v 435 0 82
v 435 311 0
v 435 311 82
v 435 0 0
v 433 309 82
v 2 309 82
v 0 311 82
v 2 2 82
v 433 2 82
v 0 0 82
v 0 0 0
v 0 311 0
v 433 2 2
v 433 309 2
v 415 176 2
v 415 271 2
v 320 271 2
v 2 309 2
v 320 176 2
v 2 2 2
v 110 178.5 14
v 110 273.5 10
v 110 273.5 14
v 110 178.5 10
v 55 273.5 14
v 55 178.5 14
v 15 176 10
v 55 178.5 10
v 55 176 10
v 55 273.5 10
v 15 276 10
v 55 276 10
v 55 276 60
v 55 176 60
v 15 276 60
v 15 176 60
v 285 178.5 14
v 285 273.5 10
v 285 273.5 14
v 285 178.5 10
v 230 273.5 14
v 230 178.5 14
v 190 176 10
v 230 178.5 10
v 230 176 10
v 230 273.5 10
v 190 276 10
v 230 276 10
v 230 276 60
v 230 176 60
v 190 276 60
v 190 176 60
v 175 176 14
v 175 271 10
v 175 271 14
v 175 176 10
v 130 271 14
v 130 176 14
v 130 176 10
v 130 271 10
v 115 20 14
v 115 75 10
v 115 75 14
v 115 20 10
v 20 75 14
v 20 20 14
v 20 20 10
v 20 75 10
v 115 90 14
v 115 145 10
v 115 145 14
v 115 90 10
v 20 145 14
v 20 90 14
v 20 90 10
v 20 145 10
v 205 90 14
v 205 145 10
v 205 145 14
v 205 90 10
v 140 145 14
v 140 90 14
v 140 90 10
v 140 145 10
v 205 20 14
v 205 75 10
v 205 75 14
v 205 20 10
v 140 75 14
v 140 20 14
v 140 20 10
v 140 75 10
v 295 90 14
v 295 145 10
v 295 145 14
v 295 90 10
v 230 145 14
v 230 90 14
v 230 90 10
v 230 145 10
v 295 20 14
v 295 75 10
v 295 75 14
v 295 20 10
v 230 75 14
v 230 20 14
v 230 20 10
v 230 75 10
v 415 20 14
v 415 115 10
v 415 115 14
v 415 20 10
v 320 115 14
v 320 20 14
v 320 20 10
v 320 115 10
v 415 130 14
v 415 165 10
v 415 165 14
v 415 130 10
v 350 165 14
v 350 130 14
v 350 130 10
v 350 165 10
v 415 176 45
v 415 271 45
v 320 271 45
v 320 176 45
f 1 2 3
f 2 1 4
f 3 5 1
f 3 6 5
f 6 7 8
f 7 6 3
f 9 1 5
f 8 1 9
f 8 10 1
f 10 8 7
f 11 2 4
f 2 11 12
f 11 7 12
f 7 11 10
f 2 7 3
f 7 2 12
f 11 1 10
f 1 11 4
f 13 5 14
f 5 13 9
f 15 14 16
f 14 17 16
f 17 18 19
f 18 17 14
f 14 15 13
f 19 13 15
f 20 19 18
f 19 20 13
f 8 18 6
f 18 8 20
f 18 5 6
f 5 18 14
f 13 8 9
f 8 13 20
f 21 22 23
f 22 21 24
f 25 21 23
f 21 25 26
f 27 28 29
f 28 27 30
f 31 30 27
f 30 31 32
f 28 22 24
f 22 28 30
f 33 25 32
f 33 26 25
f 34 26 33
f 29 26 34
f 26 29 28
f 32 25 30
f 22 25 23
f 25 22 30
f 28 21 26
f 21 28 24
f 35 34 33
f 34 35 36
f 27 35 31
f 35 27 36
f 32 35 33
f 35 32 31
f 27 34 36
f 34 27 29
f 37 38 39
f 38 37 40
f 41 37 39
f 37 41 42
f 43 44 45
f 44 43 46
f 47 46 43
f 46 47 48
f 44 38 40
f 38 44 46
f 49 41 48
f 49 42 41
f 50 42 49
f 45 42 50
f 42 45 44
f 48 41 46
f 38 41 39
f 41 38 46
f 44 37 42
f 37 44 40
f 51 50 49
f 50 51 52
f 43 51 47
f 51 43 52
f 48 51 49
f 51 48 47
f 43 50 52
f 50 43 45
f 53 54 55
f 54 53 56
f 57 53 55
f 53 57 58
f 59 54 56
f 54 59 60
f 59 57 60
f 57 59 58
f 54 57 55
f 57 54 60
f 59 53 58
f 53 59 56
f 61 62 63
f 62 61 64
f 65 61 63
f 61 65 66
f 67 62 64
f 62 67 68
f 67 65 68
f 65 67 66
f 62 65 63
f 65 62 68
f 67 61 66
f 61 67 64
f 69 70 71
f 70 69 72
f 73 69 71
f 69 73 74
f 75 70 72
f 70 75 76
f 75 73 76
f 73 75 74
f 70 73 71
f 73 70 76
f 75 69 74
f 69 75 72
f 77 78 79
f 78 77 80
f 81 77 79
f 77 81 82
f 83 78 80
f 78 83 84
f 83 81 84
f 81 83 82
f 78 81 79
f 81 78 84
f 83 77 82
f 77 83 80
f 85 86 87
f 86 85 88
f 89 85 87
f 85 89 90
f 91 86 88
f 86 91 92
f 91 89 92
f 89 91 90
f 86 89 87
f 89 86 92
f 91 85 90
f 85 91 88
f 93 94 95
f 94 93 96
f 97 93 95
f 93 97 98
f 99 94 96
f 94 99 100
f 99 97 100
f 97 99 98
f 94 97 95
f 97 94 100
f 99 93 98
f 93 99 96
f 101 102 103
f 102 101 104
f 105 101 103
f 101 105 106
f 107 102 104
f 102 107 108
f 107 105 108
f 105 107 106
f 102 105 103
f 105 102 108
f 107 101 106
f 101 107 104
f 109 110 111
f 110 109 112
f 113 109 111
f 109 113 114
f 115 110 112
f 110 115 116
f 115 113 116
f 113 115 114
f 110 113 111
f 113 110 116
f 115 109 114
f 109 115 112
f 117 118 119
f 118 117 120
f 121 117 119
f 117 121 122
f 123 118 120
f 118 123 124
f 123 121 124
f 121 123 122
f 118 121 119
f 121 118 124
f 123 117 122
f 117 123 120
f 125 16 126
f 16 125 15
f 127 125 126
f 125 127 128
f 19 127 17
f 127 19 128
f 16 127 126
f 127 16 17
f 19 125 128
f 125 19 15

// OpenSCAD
width = 435;
height = 82;
depth = 311;

margin_lr = 20;


$fn = 64;


difference() {
  cube( [ width, depth, height ] );
            
  translate( [ 2, 2, 2 ] ) {
    cube( [ width - 4, depth - 4, height + 10 ] );
  }
}



// new channel left (blue)
translate( [ 15, depth - margin_lr - 115, 10 ] ) {
  translate( [ 40, 2.5, 0 ] ) {
      cube( [ 55, 95, 4 ] );
  }
  color( "blue" )
  cube( [ 40, 100, 50 ] );   
}

// new channel right (blue)
translate( [ 190, depth - margin_lr - 115, 10 ] ) {
  translate( [ 40, 2.5, 0 ] ) {
      cube( [ 55, 95, 4 ] );
  }
  color( "blue" )
  cube( [ 40, 100, 50 ] );    
}

// adau
translate( [ 130, depth - margin_lr - 115, 10 ] ) {
    color( "pink" )
  cube( [ 45, 95, 4 ] );   
}

// SPDIF
translate( [ margin_lr, margin_lr, 10 ] ) {
  cube( [ 95, 55, 4 ] );   
}


// microprocessor (cyan)
translate( [ margin_lr, margin_lr + 70, 10 ] ) {
    color( "cyan" )
  cube( [ 95, 55, 4 ] );   
}

// subwoofer sel (magenta)
translate( [ 140, 90, 10 ] ) {
  color( "magenta" )
  cube( [ 65, 55, 4 ] );   
}

// channel sel (Yellow)
translate( [ 140, margin_lr, 10 ] ) {
  color( "yellow" )
  cube( [ 65, 55, 4 ] );   
}

// digital/ananlog power suppy
translate( [ 230, 90, 10 ] ) {
  color( "Lavender" )
  cube( [ 65, 55, 4 ] );   
}

// vinyl (RED)
translate( [ 230, margin_lr, 10 ] ) {
  color( "red" )
  cube( [ 65, 55, 4 ] );   
}




// power suppy
translate( [ width - margin_lr - 95, margin_lr, 10 ] ) {
  cube( [ 95, 95, 4 ] );   
}

// ground lift (green)
translate( [ width - margin_lr - 65, 130, 10 ] ) {
  color( "green" )
  cube( [ 65, 35, 4 ] );   
}


// toroid
translate( [ width - margin_lr - 95, depth - 135, 0 ] ) {
  cube( [ 95, 95, 45] );   
}
       
